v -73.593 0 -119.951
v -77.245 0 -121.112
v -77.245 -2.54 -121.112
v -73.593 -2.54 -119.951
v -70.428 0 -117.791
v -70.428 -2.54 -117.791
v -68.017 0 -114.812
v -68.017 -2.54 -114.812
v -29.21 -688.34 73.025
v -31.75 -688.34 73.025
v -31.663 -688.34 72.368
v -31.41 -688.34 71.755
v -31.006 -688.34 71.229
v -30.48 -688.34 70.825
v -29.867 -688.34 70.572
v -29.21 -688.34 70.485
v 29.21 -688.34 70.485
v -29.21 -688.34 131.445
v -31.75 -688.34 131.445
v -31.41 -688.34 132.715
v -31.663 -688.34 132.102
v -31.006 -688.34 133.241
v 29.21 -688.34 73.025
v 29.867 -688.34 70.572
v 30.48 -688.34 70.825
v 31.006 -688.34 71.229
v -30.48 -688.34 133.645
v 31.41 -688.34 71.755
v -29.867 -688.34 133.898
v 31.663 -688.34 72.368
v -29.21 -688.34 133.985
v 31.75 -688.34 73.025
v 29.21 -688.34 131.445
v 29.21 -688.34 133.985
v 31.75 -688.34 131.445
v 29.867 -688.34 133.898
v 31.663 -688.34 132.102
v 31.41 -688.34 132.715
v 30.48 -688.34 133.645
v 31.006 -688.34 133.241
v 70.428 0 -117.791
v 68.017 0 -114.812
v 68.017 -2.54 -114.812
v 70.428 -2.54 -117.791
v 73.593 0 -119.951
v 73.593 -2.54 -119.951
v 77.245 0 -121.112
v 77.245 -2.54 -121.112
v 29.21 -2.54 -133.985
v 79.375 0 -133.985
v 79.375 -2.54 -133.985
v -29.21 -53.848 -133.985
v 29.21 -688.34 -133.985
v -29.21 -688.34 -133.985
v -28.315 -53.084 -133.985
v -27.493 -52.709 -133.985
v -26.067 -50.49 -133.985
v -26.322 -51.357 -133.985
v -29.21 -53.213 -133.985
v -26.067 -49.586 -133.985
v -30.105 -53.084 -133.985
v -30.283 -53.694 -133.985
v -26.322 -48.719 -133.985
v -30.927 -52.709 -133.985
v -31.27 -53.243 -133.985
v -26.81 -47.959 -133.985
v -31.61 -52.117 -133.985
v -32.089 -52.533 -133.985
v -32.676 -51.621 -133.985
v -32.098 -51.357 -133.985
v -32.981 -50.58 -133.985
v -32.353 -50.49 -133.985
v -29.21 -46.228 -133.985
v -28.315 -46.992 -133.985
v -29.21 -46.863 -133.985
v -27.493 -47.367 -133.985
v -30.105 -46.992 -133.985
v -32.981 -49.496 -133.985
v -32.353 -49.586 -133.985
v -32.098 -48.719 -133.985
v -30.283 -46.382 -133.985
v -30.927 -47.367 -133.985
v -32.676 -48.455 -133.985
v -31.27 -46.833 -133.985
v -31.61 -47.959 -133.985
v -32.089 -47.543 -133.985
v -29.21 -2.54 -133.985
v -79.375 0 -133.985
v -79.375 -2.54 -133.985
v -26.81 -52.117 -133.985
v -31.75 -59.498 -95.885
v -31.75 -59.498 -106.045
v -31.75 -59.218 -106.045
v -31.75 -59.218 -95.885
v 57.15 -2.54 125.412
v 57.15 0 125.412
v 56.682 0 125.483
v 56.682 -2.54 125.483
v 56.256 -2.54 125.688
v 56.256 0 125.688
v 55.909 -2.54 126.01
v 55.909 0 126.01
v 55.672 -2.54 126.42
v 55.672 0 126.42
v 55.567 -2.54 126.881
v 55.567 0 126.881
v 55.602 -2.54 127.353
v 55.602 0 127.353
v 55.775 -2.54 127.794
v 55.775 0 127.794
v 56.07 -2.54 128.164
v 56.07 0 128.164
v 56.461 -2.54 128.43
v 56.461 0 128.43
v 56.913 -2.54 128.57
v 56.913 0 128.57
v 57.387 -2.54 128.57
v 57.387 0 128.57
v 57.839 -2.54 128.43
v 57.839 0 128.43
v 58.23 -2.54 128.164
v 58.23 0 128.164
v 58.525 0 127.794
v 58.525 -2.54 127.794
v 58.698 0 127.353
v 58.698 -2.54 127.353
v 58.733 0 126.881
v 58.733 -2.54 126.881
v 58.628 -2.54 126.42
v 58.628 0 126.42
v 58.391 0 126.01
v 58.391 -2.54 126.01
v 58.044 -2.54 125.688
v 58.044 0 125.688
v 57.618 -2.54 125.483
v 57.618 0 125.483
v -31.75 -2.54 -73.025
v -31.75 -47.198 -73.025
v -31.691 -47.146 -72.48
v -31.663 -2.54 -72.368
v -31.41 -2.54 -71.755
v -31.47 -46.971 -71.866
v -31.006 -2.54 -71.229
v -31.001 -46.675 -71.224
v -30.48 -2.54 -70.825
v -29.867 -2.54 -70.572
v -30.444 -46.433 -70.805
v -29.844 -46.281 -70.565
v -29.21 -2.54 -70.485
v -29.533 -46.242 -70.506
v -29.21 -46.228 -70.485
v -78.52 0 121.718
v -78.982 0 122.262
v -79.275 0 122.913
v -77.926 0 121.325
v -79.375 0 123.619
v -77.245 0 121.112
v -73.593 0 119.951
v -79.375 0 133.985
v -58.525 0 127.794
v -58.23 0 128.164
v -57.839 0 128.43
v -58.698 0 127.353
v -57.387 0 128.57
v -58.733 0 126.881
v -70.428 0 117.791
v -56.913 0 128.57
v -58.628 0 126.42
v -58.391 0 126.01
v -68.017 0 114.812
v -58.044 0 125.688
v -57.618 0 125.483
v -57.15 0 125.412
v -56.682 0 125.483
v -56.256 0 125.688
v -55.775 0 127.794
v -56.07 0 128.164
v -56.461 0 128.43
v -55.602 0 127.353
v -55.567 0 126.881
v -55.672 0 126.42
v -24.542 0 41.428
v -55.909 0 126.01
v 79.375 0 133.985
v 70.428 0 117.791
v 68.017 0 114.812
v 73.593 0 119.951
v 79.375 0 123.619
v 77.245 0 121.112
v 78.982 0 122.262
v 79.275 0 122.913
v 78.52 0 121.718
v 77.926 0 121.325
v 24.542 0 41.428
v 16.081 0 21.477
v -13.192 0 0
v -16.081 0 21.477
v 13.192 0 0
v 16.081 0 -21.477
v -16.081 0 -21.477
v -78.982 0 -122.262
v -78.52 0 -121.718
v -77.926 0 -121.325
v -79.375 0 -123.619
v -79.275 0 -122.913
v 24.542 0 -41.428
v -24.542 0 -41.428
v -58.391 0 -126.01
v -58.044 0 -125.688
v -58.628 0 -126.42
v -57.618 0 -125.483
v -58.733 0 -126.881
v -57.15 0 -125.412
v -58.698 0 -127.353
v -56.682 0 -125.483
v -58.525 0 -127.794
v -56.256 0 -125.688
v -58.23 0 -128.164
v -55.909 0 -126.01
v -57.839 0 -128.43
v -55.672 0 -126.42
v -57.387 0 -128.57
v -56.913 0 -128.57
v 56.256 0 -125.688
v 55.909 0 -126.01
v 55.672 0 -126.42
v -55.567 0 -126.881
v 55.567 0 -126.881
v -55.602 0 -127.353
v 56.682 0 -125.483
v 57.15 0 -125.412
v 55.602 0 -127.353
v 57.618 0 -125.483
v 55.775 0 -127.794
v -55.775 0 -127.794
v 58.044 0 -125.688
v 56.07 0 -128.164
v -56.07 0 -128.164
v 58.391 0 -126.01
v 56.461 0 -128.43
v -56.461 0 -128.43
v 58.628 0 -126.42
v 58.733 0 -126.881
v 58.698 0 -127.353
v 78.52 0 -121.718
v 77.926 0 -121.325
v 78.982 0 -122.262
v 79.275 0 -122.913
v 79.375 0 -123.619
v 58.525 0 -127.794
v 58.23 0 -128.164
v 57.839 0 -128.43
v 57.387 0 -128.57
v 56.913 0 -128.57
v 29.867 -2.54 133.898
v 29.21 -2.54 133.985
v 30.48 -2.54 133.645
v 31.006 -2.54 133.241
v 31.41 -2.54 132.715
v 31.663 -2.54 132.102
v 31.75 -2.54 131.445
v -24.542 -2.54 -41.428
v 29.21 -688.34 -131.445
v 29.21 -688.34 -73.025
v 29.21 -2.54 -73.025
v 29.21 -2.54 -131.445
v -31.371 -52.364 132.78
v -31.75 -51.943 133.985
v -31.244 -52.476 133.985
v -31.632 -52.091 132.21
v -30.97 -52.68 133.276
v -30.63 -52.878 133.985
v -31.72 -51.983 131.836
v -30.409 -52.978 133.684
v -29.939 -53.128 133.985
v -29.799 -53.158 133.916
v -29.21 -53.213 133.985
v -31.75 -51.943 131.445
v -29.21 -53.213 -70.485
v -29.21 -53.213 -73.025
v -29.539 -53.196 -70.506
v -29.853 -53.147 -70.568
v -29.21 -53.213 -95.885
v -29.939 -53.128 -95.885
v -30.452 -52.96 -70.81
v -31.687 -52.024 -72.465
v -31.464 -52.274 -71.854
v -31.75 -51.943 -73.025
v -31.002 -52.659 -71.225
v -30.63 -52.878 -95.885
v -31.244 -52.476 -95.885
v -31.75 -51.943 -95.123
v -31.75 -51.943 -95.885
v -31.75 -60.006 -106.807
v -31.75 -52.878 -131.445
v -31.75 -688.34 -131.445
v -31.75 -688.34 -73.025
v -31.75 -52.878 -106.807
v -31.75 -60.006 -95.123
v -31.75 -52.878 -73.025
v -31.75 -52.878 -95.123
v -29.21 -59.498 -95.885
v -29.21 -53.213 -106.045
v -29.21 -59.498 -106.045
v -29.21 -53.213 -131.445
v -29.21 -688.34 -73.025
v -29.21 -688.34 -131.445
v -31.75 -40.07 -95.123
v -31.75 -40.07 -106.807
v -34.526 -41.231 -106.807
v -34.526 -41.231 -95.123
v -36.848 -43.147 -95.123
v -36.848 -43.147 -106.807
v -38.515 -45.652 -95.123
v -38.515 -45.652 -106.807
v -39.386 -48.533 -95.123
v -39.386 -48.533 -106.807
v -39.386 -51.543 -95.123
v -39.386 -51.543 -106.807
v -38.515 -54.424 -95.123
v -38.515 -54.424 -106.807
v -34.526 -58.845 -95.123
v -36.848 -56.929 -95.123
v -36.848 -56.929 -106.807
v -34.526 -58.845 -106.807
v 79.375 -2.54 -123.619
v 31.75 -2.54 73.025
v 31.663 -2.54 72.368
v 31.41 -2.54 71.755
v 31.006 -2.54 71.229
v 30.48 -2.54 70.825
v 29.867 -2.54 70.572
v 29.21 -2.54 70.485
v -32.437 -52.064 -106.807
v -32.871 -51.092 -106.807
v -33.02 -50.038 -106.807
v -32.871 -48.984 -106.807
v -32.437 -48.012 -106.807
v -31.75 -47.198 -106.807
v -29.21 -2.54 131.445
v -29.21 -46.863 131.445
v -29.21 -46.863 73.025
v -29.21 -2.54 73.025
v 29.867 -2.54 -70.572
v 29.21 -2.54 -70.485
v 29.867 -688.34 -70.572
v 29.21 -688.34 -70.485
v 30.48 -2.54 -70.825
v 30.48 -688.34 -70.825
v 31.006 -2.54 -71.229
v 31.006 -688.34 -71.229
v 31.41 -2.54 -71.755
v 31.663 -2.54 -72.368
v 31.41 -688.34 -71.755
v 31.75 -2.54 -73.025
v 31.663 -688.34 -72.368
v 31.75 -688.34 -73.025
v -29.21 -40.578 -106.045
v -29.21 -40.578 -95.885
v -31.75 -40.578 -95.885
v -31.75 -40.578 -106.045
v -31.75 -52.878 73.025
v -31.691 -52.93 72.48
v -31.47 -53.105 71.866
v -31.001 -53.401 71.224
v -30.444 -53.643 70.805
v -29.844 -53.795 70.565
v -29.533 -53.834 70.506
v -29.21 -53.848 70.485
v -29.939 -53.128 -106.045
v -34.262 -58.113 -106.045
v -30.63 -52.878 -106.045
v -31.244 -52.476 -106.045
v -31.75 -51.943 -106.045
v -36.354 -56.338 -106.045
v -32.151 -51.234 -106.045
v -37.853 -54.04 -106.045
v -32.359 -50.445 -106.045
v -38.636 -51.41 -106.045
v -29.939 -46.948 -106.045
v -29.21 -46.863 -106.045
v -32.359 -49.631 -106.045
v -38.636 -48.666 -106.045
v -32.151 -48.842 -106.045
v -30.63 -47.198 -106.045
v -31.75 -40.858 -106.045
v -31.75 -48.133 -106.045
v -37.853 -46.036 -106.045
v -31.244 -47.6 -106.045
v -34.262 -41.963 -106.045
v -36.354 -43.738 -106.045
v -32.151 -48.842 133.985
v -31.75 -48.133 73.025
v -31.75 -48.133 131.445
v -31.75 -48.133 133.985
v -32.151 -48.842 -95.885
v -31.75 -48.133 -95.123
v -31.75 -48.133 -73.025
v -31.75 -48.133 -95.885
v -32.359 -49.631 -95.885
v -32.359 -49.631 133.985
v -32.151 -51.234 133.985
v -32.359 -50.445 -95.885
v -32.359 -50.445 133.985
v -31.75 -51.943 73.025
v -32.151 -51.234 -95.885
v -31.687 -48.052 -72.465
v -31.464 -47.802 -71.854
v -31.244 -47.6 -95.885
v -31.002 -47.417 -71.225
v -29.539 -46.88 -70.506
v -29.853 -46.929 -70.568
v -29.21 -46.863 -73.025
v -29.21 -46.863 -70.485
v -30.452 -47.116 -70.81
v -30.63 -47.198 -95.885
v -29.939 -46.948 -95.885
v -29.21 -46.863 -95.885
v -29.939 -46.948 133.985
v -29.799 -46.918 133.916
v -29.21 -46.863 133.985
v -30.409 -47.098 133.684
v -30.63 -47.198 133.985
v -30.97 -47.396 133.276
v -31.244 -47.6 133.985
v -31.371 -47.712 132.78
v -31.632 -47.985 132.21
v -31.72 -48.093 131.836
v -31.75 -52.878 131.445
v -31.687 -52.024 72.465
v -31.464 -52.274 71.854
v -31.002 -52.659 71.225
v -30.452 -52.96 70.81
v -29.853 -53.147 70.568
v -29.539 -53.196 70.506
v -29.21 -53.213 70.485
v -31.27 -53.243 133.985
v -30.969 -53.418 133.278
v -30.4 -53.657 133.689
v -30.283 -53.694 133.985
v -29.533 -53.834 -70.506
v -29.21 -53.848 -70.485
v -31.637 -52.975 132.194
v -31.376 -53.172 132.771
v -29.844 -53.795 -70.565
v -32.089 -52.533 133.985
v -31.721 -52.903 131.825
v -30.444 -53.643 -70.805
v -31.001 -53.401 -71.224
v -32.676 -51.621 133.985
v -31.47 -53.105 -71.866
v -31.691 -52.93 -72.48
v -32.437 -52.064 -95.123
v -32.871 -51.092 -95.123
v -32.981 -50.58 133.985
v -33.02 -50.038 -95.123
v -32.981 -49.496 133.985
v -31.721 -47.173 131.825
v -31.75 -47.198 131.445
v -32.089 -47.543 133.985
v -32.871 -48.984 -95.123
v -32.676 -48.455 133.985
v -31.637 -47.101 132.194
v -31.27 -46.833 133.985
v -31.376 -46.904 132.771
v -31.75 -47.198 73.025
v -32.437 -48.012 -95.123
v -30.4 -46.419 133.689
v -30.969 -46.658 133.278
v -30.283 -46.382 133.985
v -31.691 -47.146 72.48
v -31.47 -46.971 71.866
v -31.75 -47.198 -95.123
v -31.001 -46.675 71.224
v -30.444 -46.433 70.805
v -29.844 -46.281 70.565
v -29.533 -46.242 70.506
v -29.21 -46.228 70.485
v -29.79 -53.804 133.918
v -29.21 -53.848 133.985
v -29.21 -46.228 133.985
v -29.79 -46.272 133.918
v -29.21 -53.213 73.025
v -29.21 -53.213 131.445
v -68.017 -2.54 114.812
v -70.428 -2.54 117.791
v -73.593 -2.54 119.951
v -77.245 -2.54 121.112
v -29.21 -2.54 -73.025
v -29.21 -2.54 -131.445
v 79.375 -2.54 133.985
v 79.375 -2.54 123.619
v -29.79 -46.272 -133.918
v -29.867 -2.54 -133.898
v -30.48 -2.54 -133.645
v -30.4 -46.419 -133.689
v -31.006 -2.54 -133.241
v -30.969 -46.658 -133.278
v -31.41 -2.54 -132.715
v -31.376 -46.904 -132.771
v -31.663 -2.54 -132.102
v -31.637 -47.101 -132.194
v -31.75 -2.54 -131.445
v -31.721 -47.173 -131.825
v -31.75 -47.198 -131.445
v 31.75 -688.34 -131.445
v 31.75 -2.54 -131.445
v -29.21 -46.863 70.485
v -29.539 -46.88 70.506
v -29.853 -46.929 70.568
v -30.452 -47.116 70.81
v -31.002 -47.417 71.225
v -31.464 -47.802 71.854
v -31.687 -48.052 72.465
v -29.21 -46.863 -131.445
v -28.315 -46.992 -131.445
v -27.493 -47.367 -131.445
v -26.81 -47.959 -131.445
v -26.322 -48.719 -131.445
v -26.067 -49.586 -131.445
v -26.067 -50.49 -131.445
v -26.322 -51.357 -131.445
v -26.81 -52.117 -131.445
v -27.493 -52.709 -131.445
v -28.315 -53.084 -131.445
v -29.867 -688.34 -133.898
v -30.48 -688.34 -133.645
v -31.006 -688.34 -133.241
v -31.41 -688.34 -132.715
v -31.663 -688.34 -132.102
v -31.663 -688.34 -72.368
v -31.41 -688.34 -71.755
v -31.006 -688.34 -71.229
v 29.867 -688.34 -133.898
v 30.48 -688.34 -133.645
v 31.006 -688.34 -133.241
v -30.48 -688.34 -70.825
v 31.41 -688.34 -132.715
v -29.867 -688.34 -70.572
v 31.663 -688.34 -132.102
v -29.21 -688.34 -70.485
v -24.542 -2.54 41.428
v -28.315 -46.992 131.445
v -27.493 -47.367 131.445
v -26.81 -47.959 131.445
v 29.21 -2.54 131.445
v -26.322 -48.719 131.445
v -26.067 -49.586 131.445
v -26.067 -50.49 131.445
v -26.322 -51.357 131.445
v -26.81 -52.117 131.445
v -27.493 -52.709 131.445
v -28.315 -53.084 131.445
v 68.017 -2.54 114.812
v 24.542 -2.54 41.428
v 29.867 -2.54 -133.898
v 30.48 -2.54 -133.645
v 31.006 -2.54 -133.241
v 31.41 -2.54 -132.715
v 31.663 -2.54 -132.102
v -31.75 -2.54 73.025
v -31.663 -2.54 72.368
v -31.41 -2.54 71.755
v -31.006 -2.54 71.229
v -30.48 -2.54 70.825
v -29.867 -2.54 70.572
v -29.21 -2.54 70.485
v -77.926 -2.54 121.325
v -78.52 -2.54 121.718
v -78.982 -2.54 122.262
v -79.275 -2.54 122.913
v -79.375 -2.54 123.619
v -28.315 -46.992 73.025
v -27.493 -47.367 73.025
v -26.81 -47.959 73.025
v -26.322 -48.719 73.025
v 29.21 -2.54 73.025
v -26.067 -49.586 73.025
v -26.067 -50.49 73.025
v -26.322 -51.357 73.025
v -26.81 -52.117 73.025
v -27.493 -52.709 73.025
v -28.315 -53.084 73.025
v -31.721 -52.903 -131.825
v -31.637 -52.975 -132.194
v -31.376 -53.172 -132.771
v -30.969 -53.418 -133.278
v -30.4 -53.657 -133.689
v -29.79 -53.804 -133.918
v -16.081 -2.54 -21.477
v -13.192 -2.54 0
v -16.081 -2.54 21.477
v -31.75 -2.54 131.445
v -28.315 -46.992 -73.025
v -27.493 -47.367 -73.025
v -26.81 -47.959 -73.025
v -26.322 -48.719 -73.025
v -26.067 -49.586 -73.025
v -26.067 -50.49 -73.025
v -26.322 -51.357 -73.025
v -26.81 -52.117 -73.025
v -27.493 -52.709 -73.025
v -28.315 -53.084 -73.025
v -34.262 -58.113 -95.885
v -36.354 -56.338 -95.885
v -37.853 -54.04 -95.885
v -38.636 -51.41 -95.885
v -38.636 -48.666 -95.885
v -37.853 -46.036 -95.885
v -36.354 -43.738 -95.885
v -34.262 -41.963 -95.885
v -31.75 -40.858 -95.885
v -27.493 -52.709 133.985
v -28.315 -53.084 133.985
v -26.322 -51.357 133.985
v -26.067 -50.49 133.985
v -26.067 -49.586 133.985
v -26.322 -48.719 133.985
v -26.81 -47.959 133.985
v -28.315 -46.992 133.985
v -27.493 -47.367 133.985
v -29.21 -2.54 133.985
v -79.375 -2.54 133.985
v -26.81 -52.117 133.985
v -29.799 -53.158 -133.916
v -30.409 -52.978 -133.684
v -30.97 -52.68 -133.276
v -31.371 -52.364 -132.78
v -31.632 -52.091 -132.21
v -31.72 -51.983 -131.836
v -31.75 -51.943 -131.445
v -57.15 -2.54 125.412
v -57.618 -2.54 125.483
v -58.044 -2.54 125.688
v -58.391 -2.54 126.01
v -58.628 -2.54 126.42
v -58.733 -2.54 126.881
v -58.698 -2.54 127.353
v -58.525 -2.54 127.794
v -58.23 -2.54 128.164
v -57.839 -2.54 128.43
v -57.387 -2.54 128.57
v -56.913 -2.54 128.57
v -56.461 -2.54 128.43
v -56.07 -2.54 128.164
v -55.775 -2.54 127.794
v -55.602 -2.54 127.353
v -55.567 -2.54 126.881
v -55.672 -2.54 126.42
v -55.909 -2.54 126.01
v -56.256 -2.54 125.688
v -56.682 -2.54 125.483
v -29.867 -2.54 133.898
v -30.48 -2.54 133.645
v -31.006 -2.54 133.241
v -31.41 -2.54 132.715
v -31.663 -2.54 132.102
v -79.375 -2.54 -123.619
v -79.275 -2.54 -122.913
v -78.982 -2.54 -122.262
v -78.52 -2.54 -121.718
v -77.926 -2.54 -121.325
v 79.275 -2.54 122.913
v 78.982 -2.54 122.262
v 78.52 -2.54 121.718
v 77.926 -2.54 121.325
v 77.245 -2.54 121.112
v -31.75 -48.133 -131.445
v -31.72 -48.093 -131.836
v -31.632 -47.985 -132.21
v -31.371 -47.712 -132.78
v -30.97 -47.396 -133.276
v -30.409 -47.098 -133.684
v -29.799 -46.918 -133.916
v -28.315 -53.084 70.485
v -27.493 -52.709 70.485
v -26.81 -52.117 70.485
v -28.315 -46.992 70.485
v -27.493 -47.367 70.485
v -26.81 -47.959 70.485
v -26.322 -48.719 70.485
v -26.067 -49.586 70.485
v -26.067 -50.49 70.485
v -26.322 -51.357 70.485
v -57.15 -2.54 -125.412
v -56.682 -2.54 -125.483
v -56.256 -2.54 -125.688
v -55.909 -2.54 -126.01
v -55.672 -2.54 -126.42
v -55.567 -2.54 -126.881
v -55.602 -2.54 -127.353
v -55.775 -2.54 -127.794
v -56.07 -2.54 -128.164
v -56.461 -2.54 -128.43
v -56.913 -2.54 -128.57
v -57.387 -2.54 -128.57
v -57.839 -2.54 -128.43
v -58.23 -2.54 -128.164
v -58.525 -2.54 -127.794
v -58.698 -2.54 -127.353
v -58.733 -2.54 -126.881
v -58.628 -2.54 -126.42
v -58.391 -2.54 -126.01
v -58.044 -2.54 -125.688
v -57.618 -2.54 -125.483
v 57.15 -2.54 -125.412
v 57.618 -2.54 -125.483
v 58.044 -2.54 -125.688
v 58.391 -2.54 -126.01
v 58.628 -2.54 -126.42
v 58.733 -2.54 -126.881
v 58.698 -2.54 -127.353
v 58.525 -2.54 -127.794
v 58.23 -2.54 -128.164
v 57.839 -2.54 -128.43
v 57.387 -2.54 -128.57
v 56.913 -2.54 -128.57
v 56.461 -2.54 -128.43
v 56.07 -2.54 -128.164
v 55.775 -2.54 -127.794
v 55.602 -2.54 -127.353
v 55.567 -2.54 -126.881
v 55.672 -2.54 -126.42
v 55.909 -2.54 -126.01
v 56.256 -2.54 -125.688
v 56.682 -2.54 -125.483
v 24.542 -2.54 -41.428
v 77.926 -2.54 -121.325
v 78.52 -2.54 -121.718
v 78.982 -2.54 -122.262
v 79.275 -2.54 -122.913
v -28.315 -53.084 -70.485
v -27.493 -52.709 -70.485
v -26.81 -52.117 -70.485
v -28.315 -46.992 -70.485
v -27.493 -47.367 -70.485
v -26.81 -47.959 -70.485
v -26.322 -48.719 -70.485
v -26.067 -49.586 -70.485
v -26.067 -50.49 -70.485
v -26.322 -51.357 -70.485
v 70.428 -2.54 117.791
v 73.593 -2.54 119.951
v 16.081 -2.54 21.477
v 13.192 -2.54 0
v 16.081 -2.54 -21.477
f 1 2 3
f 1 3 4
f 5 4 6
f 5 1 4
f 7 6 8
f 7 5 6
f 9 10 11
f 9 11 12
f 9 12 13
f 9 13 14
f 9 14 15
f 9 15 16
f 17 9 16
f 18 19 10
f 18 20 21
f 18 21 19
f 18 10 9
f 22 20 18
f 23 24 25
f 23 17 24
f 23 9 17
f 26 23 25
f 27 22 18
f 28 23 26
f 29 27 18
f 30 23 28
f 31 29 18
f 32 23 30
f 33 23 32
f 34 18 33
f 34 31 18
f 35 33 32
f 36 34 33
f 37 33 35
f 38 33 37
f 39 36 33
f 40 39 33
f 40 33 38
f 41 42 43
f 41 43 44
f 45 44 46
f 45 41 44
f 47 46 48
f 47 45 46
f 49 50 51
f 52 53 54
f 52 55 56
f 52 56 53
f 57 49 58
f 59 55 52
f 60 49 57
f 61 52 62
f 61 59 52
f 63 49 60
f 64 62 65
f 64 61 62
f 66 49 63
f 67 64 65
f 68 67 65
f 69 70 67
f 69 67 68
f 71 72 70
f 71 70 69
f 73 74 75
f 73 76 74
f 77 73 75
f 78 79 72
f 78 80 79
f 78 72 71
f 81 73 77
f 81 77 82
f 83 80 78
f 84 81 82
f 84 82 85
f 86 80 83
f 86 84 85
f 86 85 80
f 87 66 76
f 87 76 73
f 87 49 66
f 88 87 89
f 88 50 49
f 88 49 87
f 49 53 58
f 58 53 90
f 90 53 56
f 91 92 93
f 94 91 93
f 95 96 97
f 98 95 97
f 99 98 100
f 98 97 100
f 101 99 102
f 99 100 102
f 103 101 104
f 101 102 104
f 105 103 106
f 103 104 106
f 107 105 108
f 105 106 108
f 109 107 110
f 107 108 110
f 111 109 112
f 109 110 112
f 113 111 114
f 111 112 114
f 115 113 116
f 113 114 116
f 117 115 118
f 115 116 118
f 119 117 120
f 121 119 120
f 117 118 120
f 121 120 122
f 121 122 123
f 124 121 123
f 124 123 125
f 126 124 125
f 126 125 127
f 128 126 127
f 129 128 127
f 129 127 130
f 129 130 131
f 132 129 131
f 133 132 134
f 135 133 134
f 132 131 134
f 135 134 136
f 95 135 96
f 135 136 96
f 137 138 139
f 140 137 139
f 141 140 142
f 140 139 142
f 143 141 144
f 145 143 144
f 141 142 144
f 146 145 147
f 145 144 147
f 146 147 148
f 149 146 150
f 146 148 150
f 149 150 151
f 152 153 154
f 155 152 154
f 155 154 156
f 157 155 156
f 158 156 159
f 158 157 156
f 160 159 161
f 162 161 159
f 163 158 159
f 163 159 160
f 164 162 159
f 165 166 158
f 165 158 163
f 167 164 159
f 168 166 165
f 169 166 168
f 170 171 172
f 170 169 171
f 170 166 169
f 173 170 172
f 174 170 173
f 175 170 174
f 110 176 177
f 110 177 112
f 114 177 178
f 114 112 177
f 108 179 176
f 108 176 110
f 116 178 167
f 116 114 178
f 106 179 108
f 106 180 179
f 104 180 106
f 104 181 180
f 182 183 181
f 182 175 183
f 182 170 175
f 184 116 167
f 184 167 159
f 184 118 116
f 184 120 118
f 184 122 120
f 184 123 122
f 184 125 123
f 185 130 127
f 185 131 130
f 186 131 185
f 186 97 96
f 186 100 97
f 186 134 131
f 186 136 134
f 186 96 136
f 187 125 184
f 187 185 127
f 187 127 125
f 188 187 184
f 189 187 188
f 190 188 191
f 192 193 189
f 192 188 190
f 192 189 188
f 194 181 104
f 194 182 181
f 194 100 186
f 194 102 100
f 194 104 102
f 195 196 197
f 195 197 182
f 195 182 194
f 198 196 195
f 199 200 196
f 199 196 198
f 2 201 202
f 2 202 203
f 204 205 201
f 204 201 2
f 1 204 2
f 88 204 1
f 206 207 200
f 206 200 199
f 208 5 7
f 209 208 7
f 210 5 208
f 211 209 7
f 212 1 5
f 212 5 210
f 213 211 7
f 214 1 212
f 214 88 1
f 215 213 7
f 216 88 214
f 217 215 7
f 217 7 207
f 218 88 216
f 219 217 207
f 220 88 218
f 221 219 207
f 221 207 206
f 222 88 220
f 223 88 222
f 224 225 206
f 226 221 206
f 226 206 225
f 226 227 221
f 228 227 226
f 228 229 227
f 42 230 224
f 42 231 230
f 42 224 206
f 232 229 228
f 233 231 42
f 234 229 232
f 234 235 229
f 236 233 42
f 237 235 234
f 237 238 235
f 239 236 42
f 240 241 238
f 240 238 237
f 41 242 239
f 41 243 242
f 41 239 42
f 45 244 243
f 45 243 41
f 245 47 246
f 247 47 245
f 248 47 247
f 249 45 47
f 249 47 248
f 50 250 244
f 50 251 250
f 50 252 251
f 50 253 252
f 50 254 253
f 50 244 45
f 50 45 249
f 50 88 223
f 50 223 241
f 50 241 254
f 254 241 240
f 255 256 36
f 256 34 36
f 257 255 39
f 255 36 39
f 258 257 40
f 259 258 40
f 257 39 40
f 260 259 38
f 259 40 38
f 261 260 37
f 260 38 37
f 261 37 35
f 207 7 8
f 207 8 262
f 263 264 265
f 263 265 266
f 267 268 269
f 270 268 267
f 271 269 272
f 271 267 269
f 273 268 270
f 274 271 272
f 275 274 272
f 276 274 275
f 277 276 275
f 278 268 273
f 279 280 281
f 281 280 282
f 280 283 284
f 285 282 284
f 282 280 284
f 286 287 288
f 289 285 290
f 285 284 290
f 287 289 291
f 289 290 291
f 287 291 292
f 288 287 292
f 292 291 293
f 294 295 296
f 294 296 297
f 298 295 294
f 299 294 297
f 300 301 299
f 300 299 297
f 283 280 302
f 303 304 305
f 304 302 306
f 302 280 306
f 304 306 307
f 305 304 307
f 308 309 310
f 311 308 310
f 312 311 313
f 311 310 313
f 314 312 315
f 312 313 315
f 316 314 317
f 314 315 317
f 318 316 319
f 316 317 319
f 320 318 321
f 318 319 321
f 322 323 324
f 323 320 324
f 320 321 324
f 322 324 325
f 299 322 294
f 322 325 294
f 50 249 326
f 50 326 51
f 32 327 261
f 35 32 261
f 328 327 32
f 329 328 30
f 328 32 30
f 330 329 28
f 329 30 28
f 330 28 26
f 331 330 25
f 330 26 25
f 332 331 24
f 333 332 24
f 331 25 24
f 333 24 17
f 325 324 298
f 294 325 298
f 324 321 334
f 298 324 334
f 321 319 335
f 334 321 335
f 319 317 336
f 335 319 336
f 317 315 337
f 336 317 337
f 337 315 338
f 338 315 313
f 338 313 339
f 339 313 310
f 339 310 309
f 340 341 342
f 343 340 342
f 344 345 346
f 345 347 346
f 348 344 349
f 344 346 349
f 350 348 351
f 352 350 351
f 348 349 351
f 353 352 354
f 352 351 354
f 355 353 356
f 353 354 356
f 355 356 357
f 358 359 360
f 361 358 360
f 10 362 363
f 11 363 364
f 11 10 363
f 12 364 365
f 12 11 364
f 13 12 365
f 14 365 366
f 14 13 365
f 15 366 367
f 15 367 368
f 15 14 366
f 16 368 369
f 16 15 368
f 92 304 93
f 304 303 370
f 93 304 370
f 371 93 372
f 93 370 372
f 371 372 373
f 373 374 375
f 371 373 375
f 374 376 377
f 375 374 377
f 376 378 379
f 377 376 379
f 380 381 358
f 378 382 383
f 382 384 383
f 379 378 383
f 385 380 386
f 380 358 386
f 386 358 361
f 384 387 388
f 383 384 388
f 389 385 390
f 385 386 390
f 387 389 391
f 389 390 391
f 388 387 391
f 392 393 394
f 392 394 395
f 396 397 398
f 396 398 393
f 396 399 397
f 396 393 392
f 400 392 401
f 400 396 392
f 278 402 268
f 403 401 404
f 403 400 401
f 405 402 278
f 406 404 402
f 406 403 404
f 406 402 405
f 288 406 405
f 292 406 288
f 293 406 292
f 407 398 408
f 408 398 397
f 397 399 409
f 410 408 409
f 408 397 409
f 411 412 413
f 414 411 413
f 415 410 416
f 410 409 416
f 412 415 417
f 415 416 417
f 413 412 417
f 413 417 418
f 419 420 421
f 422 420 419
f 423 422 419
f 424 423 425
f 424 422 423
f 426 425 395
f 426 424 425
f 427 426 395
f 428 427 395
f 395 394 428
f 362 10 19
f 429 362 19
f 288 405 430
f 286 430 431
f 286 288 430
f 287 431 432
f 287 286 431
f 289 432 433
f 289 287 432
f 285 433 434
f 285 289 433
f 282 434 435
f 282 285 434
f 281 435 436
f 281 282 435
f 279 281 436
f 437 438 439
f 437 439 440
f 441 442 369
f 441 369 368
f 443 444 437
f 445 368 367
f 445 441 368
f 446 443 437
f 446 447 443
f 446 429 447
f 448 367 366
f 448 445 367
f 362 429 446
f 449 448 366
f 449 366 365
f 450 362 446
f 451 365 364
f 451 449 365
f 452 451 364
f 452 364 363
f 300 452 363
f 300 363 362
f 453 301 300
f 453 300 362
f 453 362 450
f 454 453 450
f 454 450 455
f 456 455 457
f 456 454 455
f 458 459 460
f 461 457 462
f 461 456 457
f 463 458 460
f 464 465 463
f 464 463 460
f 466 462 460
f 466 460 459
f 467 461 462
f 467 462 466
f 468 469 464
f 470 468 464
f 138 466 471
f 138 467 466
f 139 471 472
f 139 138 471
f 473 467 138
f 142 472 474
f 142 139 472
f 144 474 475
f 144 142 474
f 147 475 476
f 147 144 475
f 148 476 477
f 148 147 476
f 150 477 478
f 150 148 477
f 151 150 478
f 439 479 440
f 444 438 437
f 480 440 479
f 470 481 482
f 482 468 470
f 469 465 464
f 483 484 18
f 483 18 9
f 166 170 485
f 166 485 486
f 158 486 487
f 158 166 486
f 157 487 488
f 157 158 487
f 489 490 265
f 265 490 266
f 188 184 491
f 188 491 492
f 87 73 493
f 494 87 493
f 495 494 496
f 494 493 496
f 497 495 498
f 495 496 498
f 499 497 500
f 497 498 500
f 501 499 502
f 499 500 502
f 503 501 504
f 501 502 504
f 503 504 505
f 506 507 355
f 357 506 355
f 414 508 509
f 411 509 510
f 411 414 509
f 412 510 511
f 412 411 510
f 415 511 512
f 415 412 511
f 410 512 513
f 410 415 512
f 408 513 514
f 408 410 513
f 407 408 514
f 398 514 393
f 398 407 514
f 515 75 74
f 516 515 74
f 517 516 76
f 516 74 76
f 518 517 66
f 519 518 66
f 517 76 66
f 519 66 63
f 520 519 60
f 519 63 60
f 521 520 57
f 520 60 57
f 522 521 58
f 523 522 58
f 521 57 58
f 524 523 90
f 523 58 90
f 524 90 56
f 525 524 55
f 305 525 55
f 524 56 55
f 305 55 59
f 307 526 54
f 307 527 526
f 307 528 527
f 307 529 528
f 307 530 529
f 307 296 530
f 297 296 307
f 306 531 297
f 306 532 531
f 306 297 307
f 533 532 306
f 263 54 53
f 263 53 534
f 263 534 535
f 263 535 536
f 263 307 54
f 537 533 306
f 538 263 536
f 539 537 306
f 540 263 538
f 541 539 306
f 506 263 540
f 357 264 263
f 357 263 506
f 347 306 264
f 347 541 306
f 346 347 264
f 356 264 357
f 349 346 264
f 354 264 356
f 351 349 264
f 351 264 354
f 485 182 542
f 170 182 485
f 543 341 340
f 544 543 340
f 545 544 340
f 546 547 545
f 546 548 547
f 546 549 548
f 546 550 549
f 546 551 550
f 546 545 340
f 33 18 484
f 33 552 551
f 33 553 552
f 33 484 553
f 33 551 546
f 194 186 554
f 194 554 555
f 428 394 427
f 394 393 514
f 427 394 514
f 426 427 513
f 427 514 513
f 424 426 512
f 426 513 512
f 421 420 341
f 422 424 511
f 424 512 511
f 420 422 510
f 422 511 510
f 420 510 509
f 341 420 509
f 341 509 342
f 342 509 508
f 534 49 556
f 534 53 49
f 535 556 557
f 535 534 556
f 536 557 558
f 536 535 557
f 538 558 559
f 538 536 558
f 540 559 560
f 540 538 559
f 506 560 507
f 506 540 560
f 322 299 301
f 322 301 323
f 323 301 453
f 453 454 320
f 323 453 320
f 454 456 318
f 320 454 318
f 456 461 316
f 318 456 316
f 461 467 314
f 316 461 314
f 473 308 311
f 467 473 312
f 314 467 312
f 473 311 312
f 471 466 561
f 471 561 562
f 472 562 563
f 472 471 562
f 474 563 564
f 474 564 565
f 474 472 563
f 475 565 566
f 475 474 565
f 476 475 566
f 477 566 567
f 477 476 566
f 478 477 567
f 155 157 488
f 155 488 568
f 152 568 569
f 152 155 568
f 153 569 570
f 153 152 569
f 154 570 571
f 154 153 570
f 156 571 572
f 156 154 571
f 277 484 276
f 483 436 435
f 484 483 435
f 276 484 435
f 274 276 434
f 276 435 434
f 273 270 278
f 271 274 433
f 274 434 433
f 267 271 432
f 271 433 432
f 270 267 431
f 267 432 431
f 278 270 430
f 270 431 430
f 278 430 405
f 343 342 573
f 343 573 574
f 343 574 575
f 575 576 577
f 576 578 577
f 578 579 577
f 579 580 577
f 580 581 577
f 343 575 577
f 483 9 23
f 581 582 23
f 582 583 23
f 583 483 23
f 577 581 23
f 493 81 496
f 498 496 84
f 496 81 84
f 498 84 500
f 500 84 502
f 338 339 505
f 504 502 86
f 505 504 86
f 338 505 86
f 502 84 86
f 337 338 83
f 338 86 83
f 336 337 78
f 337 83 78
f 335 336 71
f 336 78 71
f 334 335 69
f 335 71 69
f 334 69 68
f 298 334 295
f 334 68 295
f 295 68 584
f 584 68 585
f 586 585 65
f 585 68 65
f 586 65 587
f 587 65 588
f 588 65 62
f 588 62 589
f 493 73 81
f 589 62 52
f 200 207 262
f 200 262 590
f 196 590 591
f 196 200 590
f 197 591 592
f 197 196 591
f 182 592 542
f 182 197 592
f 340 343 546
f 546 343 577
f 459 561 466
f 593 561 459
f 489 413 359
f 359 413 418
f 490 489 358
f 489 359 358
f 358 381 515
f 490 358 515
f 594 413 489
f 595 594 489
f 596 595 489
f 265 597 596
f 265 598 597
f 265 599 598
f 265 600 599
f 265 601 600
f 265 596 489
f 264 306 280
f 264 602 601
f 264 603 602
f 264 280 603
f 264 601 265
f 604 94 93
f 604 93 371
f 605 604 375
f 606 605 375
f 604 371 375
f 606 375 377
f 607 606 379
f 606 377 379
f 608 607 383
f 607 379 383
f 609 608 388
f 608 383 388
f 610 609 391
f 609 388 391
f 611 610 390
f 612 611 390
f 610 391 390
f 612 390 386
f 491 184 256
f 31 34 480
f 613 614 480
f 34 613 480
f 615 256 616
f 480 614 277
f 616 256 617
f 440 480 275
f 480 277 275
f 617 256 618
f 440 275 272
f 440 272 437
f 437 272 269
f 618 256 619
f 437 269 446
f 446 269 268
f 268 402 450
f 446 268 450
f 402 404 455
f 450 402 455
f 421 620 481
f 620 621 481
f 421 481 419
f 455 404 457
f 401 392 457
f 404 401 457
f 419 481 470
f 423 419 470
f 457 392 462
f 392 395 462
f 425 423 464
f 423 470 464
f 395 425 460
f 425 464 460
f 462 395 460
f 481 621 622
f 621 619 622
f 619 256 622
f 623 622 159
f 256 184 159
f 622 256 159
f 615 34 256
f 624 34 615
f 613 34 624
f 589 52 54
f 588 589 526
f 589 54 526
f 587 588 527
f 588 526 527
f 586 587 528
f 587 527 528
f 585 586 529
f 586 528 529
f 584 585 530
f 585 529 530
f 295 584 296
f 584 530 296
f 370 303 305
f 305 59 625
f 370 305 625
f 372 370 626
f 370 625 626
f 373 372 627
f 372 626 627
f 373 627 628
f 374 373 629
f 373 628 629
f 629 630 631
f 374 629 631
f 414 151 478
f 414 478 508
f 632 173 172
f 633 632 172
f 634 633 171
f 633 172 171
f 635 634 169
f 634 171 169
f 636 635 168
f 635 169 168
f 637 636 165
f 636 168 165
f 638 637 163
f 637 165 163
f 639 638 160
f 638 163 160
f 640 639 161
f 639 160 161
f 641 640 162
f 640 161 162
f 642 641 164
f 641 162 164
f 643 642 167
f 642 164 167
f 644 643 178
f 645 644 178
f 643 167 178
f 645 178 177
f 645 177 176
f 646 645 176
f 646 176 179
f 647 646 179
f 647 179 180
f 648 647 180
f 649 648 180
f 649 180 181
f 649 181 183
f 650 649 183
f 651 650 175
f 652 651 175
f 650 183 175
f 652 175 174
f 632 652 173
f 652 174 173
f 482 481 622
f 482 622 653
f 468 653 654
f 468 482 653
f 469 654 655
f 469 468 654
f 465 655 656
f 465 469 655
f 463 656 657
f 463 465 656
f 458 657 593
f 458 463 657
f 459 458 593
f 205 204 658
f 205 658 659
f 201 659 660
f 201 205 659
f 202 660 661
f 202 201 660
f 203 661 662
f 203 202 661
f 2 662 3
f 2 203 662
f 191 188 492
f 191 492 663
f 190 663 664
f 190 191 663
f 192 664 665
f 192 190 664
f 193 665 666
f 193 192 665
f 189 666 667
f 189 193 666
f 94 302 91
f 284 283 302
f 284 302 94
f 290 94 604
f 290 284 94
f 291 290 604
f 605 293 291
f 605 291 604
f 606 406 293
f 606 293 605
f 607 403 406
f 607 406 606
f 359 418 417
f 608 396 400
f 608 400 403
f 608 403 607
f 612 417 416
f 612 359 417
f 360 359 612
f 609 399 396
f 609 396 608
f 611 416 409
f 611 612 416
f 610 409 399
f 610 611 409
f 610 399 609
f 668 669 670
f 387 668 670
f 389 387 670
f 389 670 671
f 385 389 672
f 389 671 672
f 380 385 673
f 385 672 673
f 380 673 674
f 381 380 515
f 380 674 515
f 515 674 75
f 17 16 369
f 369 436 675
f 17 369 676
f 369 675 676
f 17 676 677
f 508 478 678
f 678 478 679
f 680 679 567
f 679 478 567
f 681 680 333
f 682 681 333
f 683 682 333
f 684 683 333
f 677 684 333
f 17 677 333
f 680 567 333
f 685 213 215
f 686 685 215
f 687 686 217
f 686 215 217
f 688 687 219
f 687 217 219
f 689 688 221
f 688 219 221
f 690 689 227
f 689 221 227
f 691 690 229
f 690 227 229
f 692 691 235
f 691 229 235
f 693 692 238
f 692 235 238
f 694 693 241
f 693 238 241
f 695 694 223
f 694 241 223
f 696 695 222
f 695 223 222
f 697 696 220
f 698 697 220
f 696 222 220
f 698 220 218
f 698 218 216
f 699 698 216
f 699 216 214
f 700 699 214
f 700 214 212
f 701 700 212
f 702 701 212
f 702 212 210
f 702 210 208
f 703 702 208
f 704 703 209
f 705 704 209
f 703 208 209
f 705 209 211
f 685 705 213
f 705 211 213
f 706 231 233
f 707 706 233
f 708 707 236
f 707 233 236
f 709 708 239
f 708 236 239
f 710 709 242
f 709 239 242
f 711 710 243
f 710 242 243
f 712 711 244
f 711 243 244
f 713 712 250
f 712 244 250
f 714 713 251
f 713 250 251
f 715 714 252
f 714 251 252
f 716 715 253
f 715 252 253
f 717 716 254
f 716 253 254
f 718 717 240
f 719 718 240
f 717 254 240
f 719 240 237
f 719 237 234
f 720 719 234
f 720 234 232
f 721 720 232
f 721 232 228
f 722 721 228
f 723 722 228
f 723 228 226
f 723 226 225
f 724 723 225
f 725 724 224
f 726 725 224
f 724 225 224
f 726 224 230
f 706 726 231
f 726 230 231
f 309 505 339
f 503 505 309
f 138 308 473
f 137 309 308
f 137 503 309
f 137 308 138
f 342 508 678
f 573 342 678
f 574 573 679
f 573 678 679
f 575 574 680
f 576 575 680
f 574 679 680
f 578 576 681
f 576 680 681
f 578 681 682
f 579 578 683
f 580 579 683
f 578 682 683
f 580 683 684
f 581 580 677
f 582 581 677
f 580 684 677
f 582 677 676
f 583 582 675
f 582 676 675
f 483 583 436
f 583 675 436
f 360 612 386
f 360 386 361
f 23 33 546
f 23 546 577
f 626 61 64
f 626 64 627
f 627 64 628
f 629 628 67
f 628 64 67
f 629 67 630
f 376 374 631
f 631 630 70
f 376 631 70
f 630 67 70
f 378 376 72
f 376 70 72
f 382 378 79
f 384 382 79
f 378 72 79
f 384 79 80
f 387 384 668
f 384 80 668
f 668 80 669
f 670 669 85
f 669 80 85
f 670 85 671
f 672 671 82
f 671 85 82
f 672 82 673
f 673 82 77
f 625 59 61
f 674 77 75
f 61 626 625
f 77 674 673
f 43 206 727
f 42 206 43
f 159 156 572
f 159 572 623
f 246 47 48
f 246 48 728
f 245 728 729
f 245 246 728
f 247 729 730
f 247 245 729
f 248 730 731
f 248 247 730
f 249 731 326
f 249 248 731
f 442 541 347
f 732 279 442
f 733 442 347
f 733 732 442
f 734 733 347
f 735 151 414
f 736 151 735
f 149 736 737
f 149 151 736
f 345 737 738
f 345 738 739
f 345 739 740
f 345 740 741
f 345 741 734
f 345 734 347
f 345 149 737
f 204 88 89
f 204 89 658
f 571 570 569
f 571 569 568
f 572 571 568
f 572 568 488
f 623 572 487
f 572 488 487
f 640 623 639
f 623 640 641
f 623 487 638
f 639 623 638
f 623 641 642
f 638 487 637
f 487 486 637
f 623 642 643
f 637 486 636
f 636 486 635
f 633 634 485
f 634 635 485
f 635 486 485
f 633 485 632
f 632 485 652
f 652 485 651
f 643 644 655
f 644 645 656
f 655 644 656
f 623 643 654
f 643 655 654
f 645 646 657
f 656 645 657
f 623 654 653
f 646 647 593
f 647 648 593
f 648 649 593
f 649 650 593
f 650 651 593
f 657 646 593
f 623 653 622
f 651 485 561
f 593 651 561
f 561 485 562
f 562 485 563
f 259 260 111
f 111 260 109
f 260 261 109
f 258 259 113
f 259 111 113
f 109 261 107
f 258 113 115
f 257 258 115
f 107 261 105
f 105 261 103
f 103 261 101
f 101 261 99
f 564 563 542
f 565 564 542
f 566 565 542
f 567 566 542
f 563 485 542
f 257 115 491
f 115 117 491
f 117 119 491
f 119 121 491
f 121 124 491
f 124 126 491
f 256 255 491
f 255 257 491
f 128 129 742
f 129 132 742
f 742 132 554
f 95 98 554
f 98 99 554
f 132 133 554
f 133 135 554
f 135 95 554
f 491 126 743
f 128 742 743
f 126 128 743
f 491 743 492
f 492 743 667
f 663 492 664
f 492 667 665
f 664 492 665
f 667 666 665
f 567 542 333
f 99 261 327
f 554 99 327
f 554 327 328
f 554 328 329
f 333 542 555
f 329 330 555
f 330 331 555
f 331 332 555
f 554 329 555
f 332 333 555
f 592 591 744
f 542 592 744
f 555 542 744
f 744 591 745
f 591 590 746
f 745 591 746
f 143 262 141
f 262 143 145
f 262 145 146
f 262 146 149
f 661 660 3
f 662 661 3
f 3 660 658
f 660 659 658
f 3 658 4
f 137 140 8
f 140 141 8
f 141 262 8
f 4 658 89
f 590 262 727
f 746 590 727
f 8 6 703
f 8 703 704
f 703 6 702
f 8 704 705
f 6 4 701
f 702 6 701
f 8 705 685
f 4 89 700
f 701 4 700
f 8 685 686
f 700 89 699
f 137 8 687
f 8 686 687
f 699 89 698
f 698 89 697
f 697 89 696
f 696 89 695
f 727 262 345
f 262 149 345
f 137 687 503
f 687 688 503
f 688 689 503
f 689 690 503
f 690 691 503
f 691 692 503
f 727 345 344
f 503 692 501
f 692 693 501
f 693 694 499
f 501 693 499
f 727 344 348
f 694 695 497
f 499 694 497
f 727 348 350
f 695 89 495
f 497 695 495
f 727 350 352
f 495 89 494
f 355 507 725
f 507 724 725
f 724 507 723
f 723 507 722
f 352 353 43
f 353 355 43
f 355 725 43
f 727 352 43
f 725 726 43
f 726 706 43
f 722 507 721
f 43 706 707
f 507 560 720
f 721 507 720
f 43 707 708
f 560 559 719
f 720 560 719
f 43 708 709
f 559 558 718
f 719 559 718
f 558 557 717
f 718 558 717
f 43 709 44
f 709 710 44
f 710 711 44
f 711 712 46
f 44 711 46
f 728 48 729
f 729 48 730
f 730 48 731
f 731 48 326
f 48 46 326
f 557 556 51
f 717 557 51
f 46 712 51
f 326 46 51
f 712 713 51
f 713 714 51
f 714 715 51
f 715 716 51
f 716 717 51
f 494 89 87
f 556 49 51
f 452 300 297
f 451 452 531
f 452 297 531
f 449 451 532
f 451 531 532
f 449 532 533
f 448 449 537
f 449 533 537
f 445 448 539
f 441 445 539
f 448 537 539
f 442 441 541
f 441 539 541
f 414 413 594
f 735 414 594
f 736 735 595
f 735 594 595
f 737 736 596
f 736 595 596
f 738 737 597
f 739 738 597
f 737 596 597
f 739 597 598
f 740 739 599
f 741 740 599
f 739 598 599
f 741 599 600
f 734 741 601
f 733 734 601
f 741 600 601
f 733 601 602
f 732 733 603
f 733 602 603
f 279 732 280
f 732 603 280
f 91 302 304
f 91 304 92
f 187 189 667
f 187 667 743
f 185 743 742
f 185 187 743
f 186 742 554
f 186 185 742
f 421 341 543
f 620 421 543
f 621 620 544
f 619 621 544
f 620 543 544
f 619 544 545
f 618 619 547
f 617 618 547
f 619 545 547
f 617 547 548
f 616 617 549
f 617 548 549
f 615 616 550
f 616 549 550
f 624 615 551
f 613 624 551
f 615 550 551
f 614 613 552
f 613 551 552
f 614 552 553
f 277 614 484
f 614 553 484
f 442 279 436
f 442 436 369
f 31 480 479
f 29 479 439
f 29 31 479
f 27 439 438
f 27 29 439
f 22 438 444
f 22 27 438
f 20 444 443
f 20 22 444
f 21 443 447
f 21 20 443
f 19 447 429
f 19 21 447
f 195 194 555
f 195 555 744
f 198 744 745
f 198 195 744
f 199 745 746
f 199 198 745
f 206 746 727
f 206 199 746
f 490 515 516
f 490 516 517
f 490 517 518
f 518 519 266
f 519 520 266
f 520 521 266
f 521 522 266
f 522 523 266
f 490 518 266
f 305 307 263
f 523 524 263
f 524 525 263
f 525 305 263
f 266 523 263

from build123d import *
from build123d.topology import SkipClean

# Parameters (mm, degrees)
SKETCH1_R           = 1.5875
BOSS_EXTRUDE1_DEPTH = 2.54
SKETCH2_W           = 63.5
SKETCH2_H           = 63.5
BOSS_EXTRUDE2_DEPTH = 685.8
SHELL1_START        = -688.34
SHELL1_OUTLINE_W    = 58.42
SHELL1_OUTLINE_H    = 58.42
SHELL1_DEPTH        = 685.8
FILLET1_R           = 2.54
FILLET2_R           = 2.54
CUT_EXTRUDE1_DEPTH  = 267.97
BOSS_EXTRUDE4_DEPTH = 27.94
BOSS_EXTRUDE5_DEPTH = 10.16
BOSS_EXTRUDE6_START = -0.762
BOSS_EXTRUDE6_DEPTH = 0.762
BOSS_EXTRUDE7_DEPTH = 0.762
BOSS_EXTRUDE8_DEPTH = 229.108
SKETCH12_W          = 2.54
SKETCH12_H          = 18.920978
CUT_EXTRUDE2_DEPTH  = 10.16


# Read off the part's stored shape, not the designer's step: Shell1
with BuildPart() as part:
    # Sketch1 → Boss-Extrude1 (new body)
    with BuildSketch(Plane(origin=(0, 0, 0), x_dir=(1, 0, 0), z_dir=(0, 1, 0))):
        with BuildLine():
            Line((-79.375, -133.985), (79.375, -133.985))
            Line((79.375, -133.985), (79.375, -123.618732))
            ThreePointArc((79.375, -123.618732), (78.770533, -121.973949), (77.244833, -121.112014))
            ThreePointArc((77.244833, -121.112014), (71.931312, -118.986411), (68.016546, -114.811929))
            Line((68.016546, -114.811929), (24.542449, -41.427653))
            ThreePointArc((24.542449, -41.427653), (13.192327, 0), (24.542449, 41.427653))
            Line((24.542449, 41.427653), (68.016546, 114.811929))
            ThreePointArc((68.016546, 114.811929), (71.931312, 118.986411), (77.244833, 121.112014))
            ThreePointArc((77.244833, 121.112014), (78.770533, 121.973949), (79.375, 123.618732))
            Line((79.375, 123.618732), (79.375, 133.985))
            Line((79.375, 133.985), (-79.375, 133.985))
            Line((-79.375, 133.985), (-79.375, 123.618732))
            ThreePointArc((-79.375, 123.618732), (-78.770533, 121.973949), (-77.244833, 121.112014))
            ThreePointArc((-77.244833, 121.112014), (-71.931312, 118.986411), (-68.016546, 114.811929))
            Line((-68.016546, 114.811929), (-24.542449, 41.427653))
            ThreePointArc((-24.542449, 41.427653), (-13.192327, 0), (-24.542449, -41.427653))
            Line((-24.542449, -41.427653), (-68.016546, -114.811929))
            ThreePointArc((-68.016546, -114.811929), (-71.931312, -118.986411), (-77.244833, -121.112014))
            ThreePointArc((-77.244833, -121.112014), (-78.770533, -121.973949), (-79.375, -123.618732))
            Line((-79.375, -123.618732), (-79.375, -133.985))
        make_face()
        with Locations(Location((-57.15, 127, 0), (0, 0, 270))):
            Circle(SKETCH1_R, mode=Mode.SUBTRACT)
        with Locations(Location((57.15, 127, 0), (0, 0, 270))):
            Circle(SKETCH1_R, mode=Mode.SUBTRACT)
        with Locations(Location((57.15, -127, 0), (0, 0, 90))):
            Circle(SKETCH1_R, mode=Mode.SUBTRACT)
        with Locations(Location((-57.15, -127, 0), (0, 0, 90))):
            Circle(SKETCH1_R, mode=Mode.SUBTRACT)
    extrude(amount=-BOSS_EXTRUDE1_DEPTH)

    # Sketch2 → Boss-Extrude2 (add)
    with BuildSketch(Plane.XZ.offset(2.54)):
        with Locations((0, -102.235)):
            Rectangle(SKETCH2_W, SKETCH2_H)
        with Locations((0, 102.235)):
            Rectangle(SKETCH2_W, SKETCH2_H)
    extrude(amount=BOSS_EXTRUDE2_DEPTH)

    # Shell1 outline → Shell1 (cut)
    with BuildSketch(Plane(origin=(0, 0, 0), x_dir=(1, 0, 0), z_dir=(0, 1, 0)).offset(SHELL1_START)):
        with Locations((0, 102.235)):
            Rectangle(SHELL1_OUTLINE_W, SHELL1_OUTLINE_H)
        with Locations((0, -102.235)):
            Rectangle(SHELL1_OUTLINE_W, SHELL1_OUTLINE_H)
    extrude(amount=SHELL1_DEPTH, mode=Mode.SUBTRACT)

    # Fillet1
    fillet1_edges = [part.edges().sort_by_distance(p)[0] for p in [
        (31.75, -345.44, 70.485),
        (31.75, -345.44, 133.985),
        (-31.75, -345.44, 133.985),
        (-31.75, -345.44, 70.485),
    ]]
    fillet(fillet1_edges, radius=FILLET1_R)

    # Fillet2
    fillet2_edges = [part.edges().sort_by_distance(p)[0] for p in [
        (-31.75, -345.44, -70.485),
        (-31.75, -345.44, -133.985),
        (31.75, -345.44, -133.985),
        (31.75, -345.44, -70.485),
    ]]
    fillet(fillet2_edges, radius=FILLET2_R)

    # Sketch4 → Cut-Extrude1 (cut)
    with BuildSketch(Plane(origin=(0, 0, -133.985), x_dir=(-1, 0, 0), z_dir=(0, 0, -1))):
        with BuildLine():
            ThreePointArc((29.21, -53.213), (31.455064, -52.283064), (32.385, -50.038))
            ThreePointArc((32.385, -50.038), (31.455064, -47.792936), (29.21, -46.863))
            Line((29.21, -46.863), (29.21, -53.213))
        make_face()
        with BuildLine():
            Line((29.21, -53.213), (29.21, -46.863))
            ThreePointArc((29.21, -46.863), (26.035, -50.038), (29.21, -53.213))
        make_face()
    extrude(amount=-CUT_EXTRUDE1_DEPTH, mode=Mode.SUBTRACT)

    # Sketch6 → Boss-Extrude4 (add)
    with BuildSketch(Plane(origin=(0, 0, -133.985), x_dir=(-1, 0, 0), z_dir=(0, 0, -1))):
        with BuildLine():
            Line((29.21, -46.863), (29.21, -46.228))
            ThreePointArc((29.21, -46.228), (33.02, -50.038), (29.21, -53.848))
            Line((29.21, -53.848), (29.21, -53.213))
            ThreePointArc((29.21, -53.213), (32.385, -50.038), (29.21, -46.863))
        make_face()
    extrude(amount=-BOSS_EXTRUDE4_DEPTH)

    # Sketch7 → Boss-Extrude5 (add)
    with BuildSketch(Plane.XY.offset(-106.045)):
        with BuildLine():
            ThreePointArc((-31.75, -40.069511), (-39.497, -50.038), (-31.75, -60.006489))
            Line((-31.75, -60.006489), (-31.75, -59.218089))
            ThreePointArc((-31.75, -59.218089), (-38.735, -50.038), (-31.75, -40.857911))
            Line((-31.75, -40.857911), (-31.75, -40.069511))
        make_face()
    extrude(amount=BOSS_EXTRUDE5_DEPTH)

    # Sketch7<2> → Boss-Extrude6 (add)
    with BuildSketch(Plane.XY.offset(-106.045).offset(BOSS_EXTRUDE6_START)):
        with BuildLine():
            ThreePointArc((-31.75, -40.069511), (-39.497, -50.038), (-31.75, -60.006489))
            Line((-31.75, -60.006489), (-31.75, -59.218089))
            ThreePointArc((-31.75, -59.218089), (-38.735, -50.038), (-31.75, -40.857911))
            Line((-31.75, -40.857911), (-31.75, -40.069511))
        make_face()
        with BuildLine():
            ThreePointArc((-31.75, -40.857911), (-38.735, -50.038), (-31.75, -59.218089))
            Line((-31.75, -59.218089), (-31.75, -52.877806))
            ThreePointArc((-31.75, -52.877806), (-33.02, -50.038), (-31.75, -47.198194))
            Line((-31.75, -47.198194), (-31.75, -40.857911))
        make_face()
    extrude(amount=BOSS_EXTRUDE6_DEPTH)

    # Sketch8 → Boss-Extrude7 (add)
    with SkipClean():  # the faces are left unmerged after this step: merging them gives an invalid solid
        with BuildSketch(Plane.XY.offset(-95.885)):
            with BuildLine():
                Line((-31.75, -40.069511), (-31.75, -48.133))
                ThreePointArc((-31.75, -48.133), (-32.385, -50.038), (-31.75, -51.943))
                Line((-31.75, -51.943), (-31.75, -60.006489))
                ThreePointArc((-31.75, -60.006489), (-39.497, -50.038), (-31.75, -40.069511))
            make_face()
        extrude(amount=BOSS_EXTRUDE7_DEPTH)

    # Sketch9 → Boss-Extrude8 (add)
    with SkipClean():  # the faces are left unmerged after this step: merging them gives an invalid solid
        with BuildSketch(Plane.XY.offset(-95.123)):
            with BuildLine():
                Line((-29.21, -46.228), (-29.21, -46.863))
                ThreePointArc((-29.21, -46.863), (-30.629903, -47.198194), (-31.75, -48.133))
                ThreePointArc((-31.75, -48.133), (-32.385, -50.038), (-31.75, -51.943))
                ThreePointArc((-31.75, -51.943), (-30.629903, -52.877806), (-29.21, -53.213))
                Line((-29.21, -53.213), (-29.21, -53.848))
                ThreePointArc((-29.21, -53.848), (-33.02, -50.038), (-29.21, -46.228))
            make_face()
        extrude(amount=BOSS_EXTRUDE8_DEPTH)

    # Sketch12 → Cut-Extrude2 (cut)
    with BuildSketch(Plane(origin=(0, 0, -95.885), x_dir=(-1, 0, 0), z_dir=(0, 0, -1))):
        with Locations((30.48, -50.038)):
            Rectangle(SKETCH12_W, SKETCH12_H)
    extrude(amount=CUT_EXTRUDE2_DEPTH, mode=Mode.SUBTRACT)


solid = part.part
